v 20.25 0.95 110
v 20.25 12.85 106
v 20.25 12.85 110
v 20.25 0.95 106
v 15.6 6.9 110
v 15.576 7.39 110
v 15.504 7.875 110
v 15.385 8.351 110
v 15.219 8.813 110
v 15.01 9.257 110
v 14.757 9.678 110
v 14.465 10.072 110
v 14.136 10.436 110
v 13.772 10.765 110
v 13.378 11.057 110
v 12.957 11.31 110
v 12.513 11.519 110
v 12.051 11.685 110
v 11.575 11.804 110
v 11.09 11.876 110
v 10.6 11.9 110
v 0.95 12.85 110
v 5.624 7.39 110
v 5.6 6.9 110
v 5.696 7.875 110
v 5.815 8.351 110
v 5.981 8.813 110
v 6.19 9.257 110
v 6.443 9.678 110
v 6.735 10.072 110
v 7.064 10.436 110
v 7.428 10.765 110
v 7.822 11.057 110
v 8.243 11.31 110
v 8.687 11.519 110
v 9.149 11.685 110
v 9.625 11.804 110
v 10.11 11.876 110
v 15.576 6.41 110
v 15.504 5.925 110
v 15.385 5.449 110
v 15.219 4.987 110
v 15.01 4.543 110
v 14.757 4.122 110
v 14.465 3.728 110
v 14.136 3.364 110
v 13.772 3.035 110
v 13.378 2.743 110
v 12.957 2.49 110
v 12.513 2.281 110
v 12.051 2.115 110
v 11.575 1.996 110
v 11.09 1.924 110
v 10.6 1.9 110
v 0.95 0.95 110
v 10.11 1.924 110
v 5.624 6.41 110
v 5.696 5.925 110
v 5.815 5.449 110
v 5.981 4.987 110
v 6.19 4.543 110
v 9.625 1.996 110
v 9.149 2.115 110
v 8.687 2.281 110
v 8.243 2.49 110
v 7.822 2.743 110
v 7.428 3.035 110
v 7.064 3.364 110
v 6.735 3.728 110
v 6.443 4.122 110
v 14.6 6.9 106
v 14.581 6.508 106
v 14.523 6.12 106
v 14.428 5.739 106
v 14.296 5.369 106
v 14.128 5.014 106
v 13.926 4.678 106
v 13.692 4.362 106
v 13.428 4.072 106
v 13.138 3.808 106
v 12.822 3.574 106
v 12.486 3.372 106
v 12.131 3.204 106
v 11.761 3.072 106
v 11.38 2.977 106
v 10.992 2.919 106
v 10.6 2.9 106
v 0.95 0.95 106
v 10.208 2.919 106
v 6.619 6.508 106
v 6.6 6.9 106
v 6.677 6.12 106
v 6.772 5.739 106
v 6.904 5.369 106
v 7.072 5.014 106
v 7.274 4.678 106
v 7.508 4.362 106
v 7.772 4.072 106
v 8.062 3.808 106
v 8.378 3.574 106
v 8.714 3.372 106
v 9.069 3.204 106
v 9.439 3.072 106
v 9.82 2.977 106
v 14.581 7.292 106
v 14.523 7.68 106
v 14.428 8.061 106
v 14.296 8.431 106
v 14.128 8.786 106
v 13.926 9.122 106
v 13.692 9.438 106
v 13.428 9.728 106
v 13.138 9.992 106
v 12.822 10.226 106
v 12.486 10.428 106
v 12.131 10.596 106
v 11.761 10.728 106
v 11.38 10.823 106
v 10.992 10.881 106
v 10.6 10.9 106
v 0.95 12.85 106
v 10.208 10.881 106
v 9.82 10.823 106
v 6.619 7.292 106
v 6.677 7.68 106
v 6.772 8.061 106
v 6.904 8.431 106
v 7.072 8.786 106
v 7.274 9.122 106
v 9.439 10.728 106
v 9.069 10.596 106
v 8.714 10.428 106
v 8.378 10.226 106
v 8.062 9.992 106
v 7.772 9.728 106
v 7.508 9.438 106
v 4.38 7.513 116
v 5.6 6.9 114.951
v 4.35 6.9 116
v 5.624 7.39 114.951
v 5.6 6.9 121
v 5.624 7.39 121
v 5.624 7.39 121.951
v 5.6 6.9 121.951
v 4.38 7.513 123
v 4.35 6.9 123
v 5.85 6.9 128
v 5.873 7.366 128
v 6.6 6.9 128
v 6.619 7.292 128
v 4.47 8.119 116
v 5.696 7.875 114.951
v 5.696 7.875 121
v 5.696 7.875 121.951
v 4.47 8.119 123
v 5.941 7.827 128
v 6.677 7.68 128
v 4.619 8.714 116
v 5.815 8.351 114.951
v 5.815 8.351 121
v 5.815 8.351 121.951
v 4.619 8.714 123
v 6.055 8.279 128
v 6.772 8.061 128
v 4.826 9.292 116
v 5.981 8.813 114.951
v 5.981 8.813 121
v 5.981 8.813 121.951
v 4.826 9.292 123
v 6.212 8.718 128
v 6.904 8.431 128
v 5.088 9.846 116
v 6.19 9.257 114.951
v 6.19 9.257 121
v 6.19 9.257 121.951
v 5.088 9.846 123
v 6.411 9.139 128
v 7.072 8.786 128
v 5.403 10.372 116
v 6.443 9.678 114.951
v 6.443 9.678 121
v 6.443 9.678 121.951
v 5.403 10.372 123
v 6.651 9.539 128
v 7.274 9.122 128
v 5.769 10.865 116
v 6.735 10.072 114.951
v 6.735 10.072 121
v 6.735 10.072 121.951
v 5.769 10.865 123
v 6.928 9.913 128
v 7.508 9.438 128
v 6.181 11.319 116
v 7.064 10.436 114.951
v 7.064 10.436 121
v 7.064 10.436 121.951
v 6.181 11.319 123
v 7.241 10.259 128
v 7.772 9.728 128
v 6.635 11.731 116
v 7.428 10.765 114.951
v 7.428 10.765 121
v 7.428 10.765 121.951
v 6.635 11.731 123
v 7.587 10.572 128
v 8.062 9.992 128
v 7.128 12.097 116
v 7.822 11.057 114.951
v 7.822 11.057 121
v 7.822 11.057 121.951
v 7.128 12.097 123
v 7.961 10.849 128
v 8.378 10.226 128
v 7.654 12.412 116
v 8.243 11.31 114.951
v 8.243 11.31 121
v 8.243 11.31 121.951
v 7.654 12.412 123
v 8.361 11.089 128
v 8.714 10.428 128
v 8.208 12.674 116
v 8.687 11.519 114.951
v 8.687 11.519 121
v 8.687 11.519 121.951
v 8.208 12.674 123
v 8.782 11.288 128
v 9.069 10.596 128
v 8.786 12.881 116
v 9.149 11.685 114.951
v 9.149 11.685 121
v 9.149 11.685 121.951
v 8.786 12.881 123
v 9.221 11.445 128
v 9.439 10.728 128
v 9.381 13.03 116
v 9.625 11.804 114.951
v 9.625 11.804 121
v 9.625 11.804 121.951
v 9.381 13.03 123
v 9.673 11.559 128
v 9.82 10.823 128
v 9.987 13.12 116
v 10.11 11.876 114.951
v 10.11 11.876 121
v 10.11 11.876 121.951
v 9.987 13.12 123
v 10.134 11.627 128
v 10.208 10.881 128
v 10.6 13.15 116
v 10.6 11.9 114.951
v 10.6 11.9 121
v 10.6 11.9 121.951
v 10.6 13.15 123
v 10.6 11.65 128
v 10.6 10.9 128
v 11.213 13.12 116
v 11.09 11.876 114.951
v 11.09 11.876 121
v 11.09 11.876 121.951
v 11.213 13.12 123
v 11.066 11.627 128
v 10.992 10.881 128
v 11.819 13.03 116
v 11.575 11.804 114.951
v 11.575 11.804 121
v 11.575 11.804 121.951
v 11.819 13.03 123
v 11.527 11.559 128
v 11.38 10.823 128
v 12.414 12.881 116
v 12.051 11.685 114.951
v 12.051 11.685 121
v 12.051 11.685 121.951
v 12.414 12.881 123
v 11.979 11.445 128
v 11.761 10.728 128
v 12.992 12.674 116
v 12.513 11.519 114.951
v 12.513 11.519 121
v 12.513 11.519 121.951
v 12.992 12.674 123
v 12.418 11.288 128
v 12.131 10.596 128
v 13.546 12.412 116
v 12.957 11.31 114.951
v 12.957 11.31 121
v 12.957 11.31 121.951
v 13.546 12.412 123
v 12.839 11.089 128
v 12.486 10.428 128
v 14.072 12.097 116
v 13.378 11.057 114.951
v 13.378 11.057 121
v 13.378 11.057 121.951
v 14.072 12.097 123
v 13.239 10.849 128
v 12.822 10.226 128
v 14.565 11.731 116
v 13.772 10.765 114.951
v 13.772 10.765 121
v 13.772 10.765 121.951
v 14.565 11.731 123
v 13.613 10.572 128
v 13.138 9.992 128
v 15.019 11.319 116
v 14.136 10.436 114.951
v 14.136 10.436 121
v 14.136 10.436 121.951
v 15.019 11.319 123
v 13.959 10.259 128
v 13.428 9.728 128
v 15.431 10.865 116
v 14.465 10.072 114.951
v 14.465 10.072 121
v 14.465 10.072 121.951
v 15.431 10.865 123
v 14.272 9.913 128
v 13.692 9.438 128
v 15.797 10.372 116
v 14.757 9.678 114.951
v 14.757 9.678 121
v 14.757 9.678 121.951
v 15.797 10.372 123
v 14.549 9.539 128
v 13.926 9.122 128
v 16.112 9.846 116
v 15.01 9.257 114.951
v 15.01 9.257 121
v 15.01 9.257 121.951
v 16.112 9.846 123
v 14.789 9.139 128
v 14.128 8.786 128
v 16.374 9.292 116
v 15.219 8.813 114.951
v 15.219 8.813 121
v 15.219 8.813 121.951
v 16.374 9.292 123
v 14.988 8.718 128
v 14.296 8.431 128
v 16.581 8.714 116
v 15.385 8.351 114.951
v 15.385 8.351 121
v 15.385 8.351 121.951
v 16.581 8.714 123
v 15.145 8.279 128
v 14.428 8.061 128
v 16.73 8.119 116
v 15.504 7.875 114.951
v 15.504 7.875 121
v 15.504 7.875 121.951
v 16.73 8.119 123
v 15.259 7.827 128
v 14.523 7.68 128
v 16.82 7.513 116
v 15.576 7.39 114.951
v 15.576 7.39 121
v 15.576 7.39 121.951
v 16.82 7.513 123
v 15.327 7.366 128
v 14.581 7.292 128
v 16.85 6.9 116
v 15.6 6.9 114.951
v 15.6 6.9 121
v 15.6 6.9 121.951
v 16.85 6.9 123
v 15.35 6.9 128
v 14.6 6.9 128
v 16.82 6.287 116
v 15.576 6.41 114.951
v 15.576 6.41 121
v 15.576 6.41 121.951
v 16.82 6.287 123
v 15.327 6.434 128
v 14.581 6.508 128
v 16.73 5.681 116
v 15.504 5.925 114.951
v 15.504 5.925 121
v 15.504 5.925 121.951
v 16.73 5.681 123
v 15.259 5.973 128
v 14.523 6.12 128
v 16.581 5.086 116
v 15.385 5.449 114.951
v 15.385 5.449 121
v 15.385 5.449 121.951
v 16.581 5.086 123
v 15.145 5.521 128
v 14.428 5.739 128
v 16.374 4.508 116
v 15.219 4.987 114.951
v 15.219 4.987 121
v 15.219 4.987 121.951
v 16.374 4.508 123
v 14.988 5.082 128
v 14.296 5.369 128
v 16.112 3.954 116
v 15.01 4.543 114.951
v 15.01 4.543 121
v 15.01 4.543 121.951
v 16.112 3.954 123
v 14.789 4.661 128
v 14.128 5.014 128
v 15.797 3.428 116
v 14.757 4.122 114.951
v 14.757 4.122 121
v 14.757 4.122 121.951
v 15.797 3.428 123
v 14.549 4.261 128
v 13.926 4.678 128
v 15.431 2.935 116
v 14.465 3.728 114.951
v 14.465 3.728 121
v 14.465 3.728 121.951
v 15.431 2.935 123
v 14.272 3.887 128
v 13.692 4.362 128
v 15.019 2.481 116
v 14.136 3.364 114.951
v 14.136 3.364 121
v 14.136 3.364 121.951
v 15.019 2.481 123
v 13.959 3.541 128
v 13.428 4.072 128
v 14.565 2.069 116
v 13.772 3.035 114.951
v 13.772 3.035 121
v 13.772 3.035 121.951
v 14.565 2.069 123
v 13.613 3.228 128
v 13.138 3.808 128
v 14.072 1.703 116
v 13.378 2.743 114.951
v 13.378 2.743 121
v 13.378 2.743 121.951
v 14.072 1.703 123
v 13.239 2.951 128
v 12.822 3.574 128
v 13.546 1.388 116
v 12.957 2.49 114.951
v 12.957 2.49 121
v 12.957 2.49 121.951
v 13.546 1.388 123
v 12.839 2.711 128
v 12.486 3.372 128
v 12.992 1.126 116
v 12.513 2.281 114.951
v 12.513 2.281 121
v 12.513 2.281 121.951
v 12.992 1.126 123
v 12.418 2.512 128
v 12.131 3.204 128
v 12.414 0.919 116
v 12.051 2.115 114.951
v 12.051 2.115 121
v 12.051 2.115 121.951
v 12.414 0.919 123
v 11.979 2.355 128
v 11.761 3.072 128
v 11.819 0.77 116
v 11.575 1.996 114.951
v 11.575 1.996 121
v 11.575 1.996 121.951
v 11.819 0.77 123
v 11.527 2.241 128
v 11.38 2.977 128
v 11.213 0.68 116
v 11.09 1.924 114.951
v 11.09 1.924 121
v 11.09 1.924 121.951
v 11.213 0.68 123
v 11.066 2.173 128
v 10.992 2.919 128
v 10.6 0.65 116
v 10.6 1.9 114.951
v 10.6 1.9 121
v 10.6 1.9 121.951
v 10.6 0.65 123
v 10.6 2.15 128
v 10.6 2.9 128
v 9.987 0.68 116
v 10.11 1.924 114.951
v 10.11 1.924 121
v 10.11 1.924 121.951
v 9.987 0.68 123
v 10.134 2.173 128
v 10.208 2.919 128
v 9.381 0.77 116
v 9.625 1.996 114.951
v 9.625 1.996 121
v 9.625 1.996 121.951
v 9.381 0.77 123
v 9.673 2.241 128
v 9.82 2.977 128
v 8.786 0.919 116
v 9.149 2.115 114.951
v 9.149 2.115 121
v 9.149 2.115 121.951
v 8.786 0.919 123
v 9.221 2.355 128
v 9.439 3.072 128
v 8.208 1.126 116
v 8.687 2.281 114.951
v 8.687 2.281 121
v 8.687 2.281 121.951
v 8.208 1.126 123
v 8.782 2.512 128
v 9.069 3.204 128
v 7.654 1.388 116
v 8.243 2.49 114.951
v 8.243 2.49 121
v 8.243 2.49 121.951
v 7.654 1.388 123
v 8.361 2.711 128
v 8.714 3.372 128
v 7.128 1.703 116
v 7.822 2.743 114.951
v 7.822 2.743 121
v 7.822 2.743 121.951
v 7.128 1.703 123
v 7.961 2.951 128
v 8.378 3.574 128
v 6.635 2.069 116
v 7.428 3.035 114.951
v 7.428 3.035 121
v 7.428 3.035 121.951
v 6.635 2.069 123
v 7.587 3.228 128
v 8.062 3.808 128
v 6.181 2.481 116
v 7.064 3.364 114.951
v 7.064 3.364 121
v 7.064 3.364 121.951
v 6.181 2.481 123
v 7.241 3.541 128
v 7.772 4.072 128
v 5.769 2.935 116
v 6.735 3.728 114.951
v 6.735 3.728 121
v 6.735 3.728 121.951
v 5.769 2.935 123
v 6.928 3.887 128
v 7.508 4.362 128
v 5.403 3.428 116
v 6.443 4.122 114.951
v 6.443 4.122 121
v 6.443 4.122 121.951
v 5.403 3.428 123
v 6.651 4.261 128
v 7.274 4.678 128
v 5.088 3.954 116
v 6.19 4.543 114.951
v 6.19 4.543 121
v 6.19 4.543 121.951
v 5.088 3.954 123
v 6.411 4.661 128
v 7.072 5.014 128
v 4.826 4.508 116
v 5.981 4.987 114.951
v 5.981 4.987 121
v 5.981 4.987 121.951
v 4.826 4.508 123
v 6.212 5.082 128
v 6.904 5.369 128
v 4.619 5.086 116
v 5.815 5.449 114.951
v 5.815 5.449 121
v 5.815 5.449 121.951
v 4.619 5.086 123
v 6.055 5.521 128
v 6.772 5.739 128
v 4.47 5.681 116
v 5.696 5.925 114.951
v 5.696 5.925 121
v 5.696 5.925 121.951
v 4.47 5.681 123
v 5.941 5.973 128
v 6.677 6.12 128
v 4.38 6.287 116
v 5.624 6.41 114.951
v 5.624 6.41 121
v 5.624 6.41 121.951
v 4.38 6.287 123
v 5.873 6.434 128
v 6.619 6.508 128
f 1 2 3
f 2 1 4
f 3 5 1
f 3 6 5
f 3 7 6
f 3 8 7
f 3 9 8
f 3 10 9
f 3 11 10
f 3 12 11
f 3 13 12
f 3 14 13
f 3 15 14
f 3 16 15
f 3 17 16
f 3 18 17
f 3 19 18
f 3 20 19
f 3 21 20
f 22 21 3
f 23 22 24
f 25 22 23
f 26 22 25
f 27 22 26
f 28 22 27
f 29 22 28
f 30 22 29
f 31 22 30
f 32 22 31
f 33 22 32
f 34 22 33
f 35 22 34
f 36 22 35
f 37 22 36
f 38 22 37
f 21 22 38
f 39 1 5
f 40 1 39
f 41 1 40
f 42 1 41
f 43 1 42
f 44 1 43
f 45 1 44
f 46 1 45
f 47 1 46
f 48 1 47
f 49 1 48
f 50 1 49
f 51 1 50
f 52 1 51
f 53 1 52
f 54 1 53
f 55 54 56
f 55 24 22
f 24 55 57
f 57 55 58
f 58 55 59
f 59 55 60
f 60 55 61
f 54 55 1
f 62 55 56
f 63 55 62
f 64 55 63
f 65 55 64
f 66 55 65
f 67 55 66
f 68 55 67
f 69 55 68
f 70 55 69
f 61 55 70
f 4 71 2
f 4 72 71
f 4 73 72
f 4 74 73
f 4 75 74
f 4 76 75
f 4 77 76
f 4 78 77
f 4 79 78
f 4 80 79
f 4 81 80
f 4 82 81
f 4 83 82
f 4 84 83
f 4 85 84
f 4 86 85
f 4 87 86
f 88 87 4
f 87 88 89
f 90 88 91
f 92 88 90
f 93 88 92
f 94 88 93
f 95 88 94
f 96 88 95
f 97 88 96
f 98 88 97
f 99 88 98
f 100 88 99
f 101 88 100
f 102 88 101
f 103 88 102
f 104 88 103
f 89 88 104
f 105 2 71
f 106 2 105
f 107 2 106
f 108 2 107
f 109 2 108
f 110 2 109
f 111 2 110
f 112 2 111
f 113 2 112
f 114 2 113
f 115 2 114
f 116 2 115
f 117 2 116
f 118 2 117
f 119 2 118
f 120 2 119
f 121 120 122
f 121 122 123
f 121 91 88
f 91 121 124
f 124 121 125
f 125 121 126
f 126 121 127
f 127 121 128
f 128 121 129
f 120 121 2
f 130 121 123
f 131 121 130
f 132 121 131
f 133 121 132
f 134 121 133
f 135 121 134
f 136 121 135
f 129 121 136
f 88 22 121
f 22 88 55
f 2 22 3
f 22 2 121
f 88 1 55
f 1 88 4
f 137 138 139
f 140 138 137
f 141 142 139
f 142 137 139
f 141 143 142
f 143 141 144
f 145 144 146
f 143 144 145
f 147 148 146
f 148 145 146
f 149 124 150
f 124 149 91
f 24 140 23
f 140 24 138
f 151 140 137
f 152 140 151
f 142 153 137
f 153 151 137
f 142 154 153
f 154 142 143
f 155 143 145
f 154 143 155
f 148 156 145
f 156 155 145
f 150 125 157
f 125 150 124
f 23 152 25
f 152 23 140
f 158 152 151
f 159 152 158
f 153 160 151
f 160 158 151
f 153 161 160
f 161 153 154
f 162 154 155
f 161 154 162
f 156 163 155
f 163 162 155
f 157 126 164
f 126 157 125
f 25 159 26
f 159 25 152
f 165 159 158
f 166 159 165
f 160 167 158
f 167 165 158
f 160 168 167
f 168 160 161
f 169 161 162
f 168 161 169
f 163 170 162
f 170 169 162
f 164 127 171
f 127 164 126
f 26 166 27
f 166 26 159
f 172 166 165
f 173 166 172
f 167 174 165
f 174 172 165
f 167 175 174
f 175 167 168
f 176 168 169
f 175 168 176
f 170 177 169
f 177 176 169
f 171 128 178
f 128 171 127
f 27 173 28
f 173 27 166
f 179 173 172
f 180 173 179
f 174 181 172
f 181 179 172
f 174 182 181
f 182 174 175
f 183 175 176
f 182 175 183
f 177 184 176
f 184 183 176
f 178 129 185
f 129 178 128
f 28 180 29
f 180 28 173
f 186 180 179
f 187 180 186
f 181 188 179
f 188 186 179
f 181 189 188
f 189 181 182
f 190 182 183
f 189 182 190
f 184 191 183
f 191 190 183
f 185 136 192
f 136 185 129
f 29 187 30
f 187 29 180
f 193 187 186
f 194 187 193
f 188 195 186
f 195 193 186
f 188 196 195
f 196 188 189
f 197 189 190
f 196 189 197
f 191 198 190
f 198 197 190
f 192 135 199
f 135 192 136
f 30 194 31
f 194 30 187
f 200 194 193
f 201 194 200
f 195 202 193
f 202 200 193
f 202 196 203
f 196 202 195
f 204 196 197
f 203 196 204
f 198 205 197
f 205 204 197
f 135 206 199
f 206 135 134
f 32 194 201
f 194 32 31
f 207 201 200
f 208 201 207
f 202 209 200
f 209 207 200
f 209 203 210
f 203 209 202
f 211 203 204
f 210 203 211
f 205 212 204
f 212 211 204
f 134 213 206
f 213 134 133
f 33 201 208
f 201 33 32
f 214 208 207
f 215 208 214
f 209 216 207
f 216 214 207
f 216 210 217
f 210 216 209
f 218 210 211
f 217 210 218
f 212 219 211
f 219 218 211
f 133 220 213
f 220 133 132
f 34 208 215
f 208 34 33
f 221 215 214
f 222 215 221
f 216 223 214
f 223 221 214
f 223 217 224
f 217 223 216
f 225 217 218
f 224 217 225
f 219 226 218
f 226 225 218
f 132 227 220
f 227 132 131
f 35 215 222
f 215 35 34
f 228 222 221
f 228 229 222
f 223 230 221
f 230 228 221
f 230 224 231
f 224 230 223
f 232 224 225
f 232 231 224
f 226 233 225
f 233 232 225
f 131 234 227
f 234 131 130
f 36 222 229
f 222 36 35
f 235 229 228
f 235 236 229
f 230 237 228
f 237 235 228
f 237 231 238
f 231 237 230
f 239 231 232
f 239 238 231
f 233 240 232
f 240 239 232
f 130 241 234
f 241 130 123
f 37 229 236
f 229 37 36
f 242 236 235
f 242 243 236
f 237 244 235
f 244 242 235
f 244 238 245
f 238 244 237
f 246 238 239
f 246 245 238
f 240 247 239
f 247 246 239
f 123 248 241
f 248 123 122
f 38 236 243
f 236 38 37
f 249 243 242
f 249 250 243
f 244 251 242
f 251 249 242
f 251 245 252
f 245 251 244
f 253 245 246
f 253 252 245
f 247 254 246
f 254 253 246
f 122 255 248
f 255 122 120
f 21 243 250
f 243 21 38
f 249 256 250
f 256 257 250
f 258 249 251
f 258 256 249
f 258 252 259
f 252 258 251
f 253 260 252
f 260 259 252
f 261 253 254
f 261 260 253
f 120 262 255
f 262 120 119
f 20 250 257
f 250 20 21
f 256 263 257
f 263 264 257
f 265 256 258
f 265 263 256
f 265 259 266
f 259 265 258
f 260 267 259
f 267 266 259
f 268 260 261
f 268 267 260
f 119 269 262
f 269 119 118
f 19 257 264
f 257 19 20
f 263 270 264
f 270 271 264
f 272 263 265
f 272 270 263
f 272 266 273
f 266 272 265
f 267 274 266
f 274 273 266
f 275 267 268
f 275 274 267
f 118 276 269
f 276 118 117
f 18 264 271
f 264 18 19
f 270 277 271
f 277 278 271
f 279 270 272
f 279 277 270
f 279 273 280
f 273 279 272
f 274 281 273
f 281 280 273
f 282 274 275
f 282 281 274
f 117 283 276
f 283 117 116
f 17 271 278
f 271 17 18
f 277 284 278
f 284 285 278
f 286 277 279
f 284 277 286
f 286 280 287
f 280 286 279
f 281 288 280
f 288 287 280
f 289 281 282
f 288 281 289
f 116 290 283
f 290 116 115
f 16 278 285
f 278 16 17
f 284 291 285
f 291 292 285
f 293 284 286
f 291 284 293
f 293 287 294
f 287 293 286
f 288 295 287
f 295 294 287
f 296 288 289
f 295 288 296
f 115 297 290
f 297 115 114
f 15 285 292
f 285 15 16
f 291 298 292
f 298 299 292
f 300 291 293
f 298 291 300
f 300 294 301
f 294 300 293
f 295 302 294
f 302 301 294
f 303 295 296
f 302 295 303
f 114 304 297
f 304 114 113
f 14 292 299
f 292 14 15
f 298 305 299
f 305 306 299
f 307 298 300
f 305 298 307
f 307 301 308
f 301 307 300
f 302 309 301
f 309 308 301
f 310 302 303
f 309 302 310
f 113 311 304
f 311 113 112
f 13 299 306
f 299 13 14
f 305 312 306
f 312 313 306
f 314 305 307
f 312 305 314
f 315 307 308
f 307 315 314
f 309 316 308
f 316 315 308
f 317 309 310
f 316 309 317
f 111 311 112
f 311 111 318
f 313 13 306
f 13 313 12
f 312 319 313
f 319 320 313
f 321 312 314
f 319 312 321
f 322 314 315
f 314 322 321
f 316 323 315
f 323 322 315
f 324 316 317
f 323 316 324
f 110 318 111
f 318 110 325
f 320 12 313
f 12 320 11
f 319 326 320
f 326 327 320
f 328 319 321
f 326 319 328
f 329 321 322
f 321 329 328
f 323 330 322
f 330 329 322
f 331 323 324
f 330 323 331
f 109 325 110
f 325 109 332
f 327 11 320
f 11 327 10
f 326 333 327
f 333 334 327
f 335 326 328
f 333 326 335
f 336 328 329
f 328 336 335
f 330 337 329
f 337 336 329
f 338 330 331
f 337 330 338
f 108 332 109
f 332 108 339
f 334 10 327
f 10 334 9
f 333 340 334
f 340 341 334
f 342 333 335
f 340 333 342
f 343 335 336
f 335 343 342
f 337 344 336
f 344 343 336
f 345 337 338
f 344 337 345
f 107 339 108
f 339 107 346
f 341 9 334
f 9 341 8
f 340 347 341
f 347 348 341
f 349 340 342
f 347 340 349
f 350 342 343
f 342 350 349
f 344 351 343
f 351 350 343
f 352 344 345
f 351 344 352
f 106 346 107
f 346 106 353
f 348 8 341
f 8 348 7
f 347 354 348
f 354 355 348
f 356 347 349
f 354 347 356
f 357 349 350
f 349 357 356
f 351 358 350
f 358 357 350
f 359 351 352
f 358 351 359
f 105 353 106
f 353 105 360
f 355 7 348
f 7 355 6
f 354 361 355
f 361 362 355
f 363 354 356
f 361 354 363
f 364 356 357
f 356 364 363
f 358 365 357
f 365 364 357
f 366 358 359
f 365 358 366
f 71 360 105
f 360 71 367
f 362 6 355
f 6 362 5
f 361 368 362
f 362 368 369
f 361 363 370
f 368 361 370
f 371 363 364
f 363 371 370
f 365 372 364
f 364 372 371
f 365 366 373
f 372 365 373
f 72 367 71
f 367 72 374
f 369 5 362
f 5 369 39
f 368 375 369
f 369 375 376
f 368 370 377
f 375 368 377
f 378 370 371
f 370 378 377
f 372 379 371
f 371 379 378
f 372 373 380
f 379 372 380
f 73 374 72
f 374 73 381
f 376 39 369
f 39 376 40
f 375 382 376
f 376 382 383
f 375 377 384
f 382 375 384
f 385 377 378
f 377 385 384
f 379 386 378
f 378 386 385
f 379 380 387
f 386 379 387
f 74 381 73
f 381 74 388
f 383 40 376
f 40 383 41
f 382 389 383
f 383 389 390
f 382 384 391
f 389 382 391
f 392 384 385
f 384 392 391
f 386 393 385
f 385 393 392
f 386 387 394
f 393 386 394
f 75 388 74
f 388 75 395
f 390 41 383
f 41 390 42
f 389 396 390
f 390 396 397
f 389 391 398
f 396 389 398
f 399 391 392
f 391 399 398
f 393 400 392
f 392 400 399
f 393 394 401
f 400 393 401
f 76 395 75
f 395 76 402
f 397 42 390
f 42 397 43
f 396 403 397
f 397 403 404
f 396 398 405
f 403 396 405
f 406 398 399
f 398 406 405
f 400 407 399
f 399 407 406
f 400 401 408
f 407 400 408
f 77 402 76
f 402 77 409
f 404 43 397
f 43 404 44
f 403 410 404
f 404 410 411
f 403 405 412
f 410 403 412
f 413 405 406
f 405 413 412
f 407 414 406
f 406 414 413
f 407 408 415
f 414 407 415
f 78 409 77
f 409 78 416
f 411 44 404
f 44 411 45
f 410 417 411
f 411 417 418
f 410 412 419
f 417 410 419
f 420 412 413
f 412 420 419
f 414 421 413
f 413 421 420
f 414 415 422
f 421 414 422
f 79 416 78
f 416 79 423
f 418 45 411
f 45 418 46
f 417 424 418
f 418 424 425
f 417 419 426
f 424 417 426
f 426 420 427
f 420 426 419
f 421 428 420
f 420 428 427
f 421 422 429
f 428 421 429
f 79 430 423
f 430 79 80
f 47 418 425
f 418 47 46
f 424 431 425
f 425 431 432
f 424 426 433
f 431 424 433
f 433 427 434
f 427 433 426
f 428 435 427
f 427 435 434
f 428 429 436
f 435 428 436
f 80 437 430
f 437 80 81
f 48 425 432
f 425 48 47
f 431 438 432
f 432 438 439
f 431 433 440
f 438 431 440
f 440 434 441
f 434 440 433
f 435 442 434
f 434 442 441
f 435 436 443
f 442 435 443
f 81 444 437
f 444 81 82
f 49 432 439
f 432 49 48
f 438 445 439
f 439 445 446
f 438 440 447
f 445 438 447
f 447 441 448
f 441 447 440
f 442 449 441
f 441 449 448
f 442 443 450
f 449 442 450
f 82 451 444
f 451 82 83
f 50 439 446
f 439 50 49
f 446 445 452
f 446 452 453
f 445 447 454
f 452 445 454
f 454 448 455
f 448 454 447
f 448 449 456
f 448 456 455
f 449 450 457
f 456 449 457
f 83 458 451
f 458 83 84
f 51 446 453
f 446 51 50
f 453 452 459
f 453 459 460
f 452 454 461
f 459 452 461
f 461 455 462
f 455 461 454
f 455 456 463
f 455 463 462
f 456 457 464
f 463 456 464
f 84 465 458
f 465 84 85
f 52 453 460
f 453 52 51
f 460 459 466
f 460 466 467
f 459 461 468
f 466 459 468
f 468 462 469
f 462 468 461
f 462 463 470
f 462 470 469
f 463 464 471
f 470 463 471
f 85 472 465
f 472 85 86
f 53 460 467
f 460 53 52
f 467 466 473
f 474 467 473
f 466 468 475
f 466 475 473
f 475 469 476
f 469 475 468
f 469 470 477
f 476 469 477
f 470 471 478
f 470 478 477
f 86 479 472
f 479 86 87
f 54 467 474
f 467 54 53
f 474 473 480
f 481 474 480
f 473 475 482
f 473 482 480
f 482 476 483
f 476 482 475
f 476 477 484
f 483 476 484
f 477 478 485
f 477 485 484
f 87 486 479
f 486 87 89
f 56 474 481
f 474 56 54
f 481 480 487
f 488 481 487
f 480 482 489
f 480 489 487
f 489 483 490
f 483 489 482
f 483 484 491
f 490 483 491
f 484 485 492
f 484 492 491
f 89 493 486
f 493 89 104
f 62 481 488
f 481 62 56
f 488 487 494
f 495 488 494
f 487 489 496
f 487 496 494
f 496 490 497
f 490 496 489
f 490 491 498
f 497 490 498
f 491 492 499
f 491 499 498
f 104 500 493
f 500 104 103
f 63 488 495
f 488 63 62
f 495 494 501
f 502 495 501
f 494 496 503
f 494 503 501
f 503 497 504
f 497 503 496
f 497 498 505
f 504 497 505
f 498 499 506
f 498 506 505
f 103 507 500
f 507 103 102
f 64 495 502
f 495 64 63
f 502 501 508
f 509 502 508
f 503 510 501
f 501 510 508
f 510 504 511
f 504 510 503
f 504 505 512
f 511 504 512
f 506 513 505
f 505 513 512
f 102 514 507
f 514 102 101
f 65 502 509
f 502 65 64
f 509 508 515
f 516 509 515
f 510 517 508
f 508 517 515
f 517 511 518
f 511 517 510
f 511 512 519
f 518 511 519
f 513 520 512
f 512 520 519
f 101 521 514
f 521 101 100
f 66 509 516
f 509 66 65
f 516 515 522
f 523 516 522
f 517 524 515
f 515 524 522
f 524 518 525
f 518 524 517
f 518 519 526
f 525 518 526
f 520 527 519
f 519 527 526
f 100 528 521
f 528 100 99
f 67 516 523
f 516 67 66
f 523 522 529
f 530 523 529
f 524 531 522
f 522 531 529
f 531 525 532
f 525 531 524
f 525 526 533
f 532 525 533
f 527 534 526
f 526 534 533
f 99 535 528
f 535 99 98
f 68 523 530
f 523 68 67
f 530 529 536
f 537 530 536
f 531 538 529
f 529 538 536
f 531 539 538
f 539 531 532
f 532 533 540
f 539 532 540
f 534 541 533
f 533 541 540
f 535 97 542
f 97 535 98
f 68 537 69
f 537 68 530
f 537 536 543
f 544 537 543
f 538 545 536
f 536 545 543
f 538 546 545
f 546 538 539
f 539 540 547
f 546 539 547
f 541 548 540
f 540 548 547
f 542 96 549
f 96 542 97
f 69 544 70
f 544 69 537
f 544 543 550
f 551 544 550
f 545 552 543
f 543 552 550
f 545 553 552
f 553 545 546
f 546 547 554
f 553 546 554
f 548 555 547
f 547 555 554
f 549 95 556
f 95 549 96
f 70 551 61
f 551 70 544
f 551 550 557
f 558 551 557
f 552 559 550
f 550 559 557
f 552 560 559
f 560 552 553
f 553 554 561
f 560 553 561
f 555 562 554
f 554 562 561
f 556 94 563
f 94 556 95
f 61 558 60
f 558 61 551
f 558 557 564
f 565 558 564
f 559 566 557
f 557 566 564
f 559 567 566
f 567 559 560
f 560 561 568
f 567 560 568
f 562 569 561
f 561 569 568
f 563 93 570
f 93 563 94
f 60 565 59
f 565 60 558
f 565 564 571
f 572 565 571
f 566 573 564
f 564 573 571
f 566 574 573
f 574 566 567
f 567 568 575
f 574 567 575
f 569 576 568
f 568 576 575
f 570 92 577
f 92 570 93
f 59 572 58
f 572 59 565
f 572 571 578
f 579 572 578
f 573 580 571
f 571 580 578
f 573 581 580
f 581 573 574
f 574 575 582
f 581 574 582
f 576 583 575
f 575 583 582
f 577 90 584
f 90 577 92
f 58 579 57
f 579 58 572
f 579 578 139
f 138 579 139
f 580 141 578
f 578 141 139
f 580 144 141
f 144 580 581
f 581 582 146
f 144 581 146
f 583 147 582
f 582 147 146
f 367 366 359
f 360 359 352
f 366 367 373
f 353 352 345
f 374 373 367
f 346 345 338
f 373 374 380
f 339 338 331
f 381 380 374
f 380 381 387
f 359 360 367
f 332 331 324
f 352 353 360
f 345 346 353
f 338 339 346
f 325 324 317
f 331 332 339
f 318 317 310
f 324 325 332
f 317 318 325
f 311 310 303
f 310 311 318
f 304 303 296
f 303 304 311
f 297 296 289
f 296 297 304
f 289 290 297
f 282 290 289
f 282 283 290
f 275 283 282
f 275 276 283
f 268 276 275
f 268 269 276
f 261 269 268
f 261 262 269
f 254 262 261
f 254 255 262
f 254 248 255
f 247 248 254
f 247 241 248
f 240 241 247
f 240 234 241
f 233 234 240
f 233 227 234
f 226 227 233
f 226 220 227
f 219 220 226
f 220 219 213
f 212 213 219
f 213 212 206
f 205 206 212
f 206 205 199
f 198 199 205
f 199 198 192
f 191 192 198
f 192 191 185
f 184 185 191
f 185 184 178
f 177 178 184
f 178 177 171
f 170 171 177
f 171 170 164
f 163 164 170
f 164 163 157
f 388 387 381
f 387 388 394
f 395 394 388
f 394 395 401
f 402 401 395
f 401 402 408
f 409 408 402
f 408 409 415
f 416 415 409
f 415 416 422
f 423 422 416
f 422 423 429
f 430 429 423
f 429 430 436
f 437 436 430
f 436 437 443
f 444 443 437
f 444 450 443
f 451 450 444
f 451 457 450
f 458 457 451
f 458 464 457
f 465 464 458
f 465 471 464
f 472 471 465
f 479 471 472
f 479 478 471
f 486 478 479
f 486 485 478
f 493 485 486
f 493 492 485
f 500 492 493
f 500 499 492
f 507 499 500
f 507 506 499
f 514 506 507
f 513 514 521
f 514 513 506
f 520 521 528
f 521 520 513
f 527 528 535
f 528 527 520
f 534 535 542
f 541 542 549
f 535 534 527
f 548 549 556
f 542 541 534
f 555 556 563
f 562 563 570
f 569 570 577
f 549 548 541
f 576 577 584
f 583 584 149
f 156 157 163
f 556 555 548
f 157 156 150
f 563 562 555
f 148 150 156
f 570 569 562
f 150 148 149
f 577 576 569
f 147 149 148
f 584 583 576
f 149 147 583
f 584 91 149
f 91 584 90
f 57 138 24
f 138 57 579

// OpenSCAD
// file: ../lib/barb.scad
// lib/barb.scad — hose barb: a rotate_extrude of a 2D (r, z) profile, axis +Z from z=0.
// Reproduces valveV2's connector (outlet, flanged) and connector_8mm (inlet) sketches:
//   a shank of shank_d carrying `ridges` crests of ridge_d; each crest rises on a face `steep`°
//   from the axis (on the base side) and tapers back to the shank over taper_len; the last
//   taper ends at tip_d on the end face z=len; bore through.
//   flange = [d, h]: a cone from ø d on z=0 to the shank at z=h (v2 exitSupport), undef = none.
//   gap: shank between the end of one taper and the next crest. v2 constrains it to 2 in both
//   sketches (DistanceX 2), so the 9-argument call reproduces v2; params.scad's barb_ridge_gap
//   is the same number for callers that want it explicit.
// The caller's $fn sets the roundness (use fn_round: these seal).

// z of crest i (0-based, counted from the base): the last crest is taper_len short of the end.
function barb_crest_z(len, ridges, taper_len, gap, i) = len - taper_len - (ridges - 1 - i)*(taper_len + gap);
// axial length of a crest's steep rise
function barb_rise_dz(shank_d, ridge_d, steep) = (ridge_d - shank_d)/2/tan(steep);

// Drop consecutive duplicate points (a rise that starts exactly where the shank starts).
function _dedupe(p, i=0, acc=[]) =
    i >= len(p) ? acc
    : _dedupe(p, i + 1, (len(acc) > 0 && norm(p[i] - acc[len(acc) - 1]) < 1e-9) ? acc : concat(acc, [p[i]]));

// The (r, z) polygon: base face, shank, crests, end face, back along the bore.
function barb_profile(bore, shank_d, ridge_d, len, ridges, taper_len, tip_d, steep, flange, gap=2) =
    let(rb = bore/2, rs = shank_d/2, rr = ridge_d/2, rt = tip_d/2,
        dz = barb_rise_dz(shank_d, ridge_d, steep),
        z_shank0 = is_undef(flange) ? 0 : flange[1],
        base = is_undef(flange) ? [[rb, 0], [rs, 0]] : [[rb, 0], [flange[0]/2, 0], [rs, flange[1]]],
        crests = [for (i = [0 : ridges - 1]) let(zc = barb_crest_z(len, ridges, taper_len, gap, i))
                    each [[rs, zc - dz], [rr, zc], i == ridges - 1 ? [rt, len] : [rs, zc + taper_len]]],
        ok = assert(ridges >= 1, "barb: ridges >= 1")
             assert(rr > rs && rs > rb && rt >= rb, "barb: need ridge_d > shank_d > bore and tip_d >= bore")
             assert(barb_crest_z(len, ridges, taper_len, gap, 0) - dz >= z_shank0 - 1e-9,
                    "barb: first crest rises before the shank starts: shorter flange, fewer ridges or a longer barb")
             assert(gap >= dz - 1e-9, "barb: gap shorter than the crest rise")
             true)
    _dedupe(concat(base, crests, [[rb, len]]));

module barb(bore, shank_d, ridge_d, len, ridges, taper_len, tip_d, steep, flange, gap=2) {
    rotate_extrude()
        polygon(barb_profile(bore, shank_d, ridge_d, len, ridges, taper_len, tip_d, steep, flange, gap));
}
// main file
// parts/inlet_cap.scad — plug + hose barb closing the back (inlet end) of the manifold
// [v2 in_cap = Body005 plug fused with connector_8mm].
//
// The plug fills the body's back end between its outer half-skins (wall/2 in from the body's
// outside on both sides and the floor) and under the lid plate, `joint_len` deep, with
// joint_clear per side so it slides in and leaves room for glue. The barb starts on the plug's
// front (gallery-side) face and runs `inlet_barb[3]` along +Z: its shank passes through the
// plug and the ridges stand `inlet_barb[3] − joint_len` proud of the back face, as v2. The
// bore ø inlet_barb[0] runs through plug and barb on the gallery axis (v2's plug hole was the
// separate barb's ø10 shank; here they are one part, so the hole is the bore).

include <../params.scad>
use <../lib/barb.scad>
$fn = fn_round;

for_print = false;

z_plug0 = body_z1 - joint_len;               // plug front face = barb base (the barb sits on gal_y, params.scad)
plug_x0 = wall/2 + joint_clear;  plug_x1 = W - wall/2 - joint_clear;
plug_y0 = wall/2 + joint_clear;  plug_y1 = top_y - wall/2 - joint_clear;
eps = 0.01;

// extents in the assembly frame: the ridges may stand proud of the plug in y (they do with the
// defaults: 13.15 above 12.85), so take the larger of plug and ridge each way
function inlet_cap_bbox() =
    [[min(plug_x0, W/2 - inlet_barb[2]/2), min(plug_y0, gal_y - inlet_barb[2]/2), z_plug0],
     [max(plug_x1, W/2 + inlet_barb[2]/2), max(plug_y1, gal_y + inlet_barb[2]/2), z_plug0 + inlet_barb[3]]];
function inlet_cap_size() = inlet_cap_bbox()[1] - inlet_cap_bbox()[0];

module inlet_cap() {
    difference() {
        union() {
            translate([plug_x0, plug_y0, z_plug0])
                cube([plug_x1 - plug_x0, plug_y1 - plug_y0, joint_len]);
            translate([W/2, gal_y, z_plug0])
                barb(inlet_barb[0], inlet_barb[1], inlet_barb[2], inlet_barb[3], barb_ridges,
                     inlet_barb_prof[0], inlet_barb_prof[1], barb_steep, undef, barb_ridge_gap);
        }
        // one bore through plug and barb: the plug fills the barb's bore where they overlap
        translate([W/2, gal_y, z_plug0 - eps]) cylinder(d=inlet_barb[0], h=inlet_barb[3] + 2*eps);
    }
}

// Plug front face on the bed, barb vertical: each ridge's rise overhangs at barb_steep from
// vertical over (ridge − shank)/2 of radius, which the layers step out without support.
module inlet_cap_print() { translate([0, 0, -z_plug0]) inlet_cap(); }

if (is_undef(ASSEMBLY)) { if (for_print) inlet_cap_print(); else inlet_cap(); }
